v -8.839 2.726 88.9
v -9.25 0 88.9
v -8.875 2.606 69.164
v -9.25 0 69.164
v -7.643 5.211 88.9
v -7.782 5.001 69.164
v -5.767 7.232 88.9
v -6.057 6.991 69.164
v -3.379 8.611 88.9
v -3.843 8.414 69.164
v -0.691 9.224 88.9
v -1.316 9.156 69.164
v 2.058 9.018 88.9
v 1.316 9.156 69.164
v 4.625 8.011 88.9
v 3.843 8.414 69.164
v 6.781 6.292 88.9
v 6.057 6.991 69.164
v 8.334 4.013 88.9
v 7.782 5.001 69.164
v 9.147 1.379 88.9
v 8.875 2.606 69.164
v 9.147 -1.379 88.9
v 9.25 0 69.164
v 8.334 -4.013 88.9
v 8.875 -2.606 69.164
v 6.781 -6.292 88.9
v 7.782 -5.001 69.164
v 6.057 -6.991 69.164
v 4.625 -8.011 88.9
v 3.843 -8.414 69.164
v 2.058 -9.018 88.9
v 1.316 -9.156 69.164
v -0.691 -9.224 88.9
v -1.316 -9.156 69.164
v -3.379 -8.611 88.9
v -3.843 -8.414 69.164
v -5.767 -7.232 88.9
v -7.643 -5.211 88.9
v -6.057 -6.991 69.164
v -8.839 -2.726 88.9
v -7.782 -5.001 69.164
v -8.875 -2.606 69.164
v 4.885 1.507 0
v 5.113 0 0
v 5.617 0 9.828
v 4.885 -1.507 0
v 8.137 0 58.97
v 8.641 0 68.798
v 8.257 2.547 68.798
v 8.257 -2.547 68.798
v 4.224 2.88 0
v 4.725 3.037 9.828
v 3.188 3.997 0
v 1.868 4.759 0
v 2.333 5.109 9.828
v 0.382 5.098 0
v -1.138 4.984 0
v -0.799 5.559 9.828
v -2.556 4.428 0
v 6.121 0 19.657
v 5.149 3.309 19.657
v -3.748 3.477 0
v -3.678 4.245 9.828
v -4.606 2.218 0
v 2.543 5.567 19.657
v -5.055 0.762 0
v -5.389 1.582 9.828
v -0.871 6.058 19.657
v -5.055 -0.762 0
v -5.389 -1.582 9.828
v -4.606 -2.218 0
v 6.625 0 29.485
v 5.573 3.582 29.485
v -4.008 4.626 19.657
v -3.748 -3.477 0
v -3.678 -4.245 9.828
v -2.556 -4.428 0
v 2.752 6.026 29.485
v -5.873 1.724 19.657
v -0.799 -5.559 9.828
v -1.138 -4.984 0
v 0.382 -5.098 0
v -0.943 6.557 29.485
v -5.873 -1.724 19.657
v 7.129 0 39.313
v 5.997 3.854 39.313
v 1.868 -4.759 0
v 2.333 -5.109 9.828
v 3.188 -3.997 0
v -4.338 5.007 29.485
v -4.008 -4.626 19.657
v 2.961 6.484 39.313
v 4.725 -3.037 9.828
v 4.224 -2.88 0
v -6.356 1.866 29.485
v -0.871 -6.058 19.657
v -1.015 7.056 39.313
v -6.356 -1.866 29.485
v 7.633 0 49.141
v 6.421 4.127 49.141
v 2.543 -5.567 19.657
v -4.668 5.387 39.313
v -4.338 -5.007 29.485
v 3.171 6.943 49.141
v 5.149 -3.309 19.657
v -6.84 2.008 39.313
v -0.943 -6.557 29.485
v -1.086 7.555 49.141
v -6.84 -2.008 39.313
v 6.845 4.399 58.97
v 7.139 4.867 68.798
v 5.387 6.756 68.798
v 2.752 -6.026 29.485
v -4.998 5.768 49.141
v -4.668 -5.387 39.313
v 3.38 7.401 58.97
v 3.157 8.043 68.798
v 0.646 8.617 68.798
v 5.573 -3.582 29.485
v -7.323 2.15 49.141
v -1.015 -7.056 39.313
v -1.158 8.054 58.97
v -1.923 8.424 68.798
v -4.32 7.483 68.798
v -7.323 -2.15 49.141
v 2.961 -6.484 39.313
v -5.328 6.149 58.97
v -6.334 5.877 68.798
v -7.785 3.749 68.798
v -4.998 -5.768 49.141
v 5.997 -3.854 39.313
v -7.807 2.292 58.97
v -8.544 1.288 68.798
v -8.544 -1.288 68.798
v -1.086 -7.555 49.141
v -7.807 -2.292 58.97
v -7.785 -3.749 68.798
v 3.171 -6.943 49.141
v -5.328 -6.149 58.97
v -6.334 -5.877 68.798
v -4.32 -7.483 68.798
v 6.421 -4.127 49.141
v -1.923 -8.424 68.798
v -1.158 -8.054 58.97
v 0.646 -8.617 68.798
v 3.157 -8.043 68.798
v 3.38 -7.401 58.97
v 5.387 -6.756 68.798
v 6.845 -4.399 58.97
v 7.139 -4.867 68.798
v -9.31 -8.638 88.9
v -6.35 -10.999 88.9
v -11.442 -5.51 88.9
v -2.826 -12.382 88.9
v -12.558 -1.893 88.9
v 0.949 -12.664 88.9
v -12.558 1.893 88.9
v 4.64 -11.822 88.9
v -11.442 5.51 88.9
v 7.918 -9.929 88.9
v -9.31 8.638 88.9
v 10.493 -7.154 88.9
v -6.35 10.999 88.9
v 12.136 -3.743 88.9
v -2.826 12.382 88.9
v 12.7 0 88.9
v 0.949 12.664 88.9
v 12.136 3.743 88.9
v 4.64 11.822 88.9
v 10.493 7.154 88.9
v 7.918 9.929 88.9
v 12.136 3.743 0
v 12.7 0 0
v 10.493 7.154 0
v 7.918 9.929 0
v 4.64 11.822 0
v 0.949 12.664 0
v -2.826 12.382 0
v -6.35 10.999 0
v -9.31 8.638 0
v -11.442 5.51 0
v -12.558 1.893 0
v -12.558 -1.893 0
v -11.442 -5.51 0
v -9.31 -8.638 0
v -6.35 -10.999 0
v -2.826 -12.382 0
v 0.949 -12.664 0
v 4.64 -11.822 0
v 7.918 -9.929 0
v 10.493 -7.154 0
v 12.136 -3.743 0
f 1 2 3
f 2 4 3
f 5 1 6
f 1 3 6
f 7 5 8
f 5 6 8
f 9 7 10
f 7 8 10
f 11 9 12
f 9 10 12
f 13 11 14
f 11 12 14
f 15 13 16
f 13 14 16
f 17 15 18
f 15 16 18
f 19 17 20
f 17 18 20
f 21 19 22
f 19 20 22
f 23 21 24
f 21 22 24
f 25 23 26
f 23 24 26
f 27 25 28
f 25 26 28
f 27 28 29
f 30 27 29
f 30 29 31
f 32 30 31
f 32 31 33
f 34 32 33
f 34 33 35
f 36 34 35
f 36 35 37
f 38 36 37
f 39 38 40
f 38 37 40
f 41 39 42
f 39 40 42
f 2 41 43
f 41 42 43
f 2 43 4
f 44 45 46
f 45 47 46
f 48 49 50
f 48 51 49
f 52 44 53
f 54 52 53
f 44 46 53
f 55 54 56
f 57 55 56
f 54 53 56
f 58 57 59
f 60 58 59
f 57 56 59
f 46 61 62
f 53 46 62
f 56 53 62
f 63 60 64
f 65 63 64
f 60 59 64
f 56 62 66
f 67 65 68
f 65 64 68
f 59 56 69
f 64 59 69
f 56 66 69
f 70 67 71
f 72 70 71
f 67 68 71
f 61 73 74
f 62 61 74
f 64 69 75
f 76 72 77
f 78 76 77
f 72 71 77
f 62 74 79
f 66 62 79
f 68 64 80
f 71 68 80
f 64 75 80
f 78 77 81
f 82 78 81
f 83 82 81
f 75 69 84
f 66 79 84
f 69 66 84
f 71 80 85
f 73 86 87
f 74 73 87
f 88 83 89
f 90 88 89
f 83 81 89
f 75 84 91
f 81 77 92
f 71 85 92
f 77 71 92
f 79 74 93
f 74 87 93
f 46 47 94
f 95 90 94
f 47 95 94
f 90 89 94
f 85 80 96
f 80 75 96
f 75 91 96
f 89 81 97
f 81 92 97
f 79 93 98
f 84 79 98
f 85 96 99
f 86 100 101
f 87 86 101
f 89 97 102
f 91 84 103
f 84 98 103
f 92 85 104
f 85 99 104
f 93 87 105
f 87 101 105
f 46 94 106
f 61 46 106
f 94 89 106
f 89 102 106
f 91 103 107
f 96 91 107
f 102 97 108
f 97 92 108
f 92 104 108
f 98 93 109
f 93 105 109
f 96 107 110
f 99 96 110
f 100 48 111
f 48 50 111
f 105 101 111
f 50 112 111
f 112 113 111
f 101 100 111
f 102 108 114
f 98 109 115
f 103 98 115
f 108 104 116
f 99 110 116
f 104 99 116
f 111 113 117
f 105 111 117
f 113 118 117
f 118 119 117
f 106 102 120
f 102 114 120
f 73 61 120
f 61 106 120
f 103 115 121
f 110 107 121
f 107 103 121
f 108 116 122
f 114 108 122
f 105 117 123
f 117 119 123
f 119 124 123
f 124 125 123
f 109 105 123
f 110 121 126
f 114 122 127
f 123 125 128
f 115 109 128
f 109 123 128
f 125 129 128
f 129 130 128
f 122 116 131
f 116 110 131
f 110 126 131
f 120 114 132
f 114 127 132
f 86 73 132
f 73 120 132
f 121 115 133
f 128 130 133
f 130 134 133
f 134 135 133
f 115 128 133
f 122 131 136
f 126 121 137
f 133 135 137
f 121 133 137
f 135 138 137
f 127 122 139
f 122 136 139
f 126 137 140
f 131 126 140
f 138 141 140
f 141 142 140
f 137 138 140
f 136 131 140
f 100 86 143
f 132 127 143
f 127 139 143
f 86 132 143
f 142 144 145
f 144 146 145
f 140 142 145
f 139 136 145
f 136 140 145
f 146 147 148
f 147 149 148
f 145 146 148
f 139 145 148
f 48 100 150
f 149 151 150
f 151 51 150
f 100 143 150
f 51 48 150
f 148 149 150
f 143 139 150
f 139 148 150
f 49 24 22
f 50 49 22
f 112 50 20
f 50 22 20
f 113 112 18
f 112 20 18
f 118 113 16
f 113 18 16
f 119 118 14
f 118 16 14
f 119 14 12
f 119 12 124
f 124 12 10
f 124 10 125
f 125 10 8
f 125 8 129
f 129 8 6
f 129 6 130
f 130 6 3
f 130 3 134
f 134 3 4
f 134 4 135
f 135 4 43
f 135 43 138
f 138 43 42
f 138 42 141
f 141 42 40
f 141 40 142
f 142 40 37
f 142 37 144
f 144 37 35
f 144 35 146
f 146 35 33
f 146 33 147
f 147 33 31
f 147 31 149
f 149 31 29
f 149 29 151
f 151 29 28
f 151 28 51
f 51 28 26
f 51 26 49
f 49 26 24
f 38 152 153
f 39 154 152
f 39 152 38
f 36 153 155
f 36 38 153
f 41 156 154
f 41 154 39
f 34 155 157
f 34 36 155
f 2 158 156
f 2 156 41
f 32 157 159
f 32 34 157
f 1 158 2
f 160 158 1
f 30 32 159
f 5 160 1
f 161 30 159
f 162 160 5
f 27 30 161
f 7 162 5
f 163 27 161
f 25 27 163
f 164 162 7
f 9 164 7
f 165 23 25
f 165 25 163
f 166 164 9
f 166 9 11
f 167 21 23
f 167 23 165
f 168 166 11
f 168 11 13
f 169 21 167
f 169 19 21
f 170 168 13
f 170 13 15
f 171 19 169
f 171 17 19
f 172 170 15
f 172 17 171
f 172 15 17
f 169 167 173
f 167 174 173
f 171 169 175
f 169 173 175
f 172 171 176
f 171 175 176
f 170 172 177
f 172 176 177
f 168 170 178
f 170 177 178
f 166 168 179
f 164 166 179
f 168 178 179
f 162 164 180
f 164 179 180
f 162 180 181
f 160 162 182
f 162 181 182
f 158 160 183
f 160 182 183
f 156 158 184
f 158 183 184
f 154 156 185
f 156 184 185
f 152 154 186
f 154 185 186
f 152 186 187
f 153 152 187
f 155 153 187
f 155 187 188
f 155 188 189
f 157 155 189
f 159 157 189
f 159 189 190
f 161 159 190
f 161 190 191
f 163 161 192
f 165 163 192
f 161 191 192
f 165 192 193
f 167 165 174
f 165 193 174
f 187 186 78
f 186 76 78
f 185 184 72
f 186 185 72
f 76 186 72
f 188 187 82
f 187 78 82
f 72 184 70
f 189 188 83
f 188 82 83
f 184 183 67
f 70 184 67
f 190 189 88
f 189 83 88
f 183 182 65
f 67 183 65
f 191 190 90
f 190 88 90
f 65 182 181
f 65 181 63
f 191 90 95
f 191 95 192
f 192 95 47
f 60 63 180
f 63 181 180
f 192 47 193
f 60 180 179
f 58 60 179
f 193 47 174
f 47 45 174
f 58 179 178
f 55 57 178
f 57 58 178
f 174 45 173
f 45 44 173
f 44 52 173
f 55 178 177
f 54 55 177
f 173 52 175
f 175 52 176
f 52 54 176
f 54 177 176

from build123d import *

# Parameters (mm, degrees)
F0_R     = 12.7
F1_DEPTH = 73.66
F2_R     = 5.1125641025
F3_DEPTH = 73.661
F3_TAPER = -2.9356734464
F4_R     = 12.7
F5_DEPTH = 15.24
F8_D     = 18.5
F8_DEPTH = 19.7358
F8_TIP   = 5.557960726


with BuildPart() as f1:
    # F0 (on Top) → F1 (new body)
    with BuildSketch(Plane.XY):
        Circle(F0_R)
    extrude(amount=F1_DEPTH)

    # F2 (on Top) → F3 (cut, through all)
    with BuildSketch(Plane.XY):
        Circle(F2_R)
    extrude(amount=F3_DEPTH, taper=F3_TAPER, mode=Mode.SUBTRACT)

    # F4 (on face) → F5 (join)
    with BuildSketch(Plane.XY.offset(73.66)):
        Circle(F4_R)
    extrude(amount=F5_DEPTH)

    # F8
    with Locations(Plane.XY.offset(88.9)):
        with Locations((0, 0)):
            Hole(F8_D / 2, depth=F8_DEPTH)
            with Locations((0, 0, -(F8_DEPTH + F8_TIP / 2))):  # 118° drill point
                Cone(0, F8_D / 2, F8_TIP, mode=Mode.SUBTRACT)


solid = f1.part
